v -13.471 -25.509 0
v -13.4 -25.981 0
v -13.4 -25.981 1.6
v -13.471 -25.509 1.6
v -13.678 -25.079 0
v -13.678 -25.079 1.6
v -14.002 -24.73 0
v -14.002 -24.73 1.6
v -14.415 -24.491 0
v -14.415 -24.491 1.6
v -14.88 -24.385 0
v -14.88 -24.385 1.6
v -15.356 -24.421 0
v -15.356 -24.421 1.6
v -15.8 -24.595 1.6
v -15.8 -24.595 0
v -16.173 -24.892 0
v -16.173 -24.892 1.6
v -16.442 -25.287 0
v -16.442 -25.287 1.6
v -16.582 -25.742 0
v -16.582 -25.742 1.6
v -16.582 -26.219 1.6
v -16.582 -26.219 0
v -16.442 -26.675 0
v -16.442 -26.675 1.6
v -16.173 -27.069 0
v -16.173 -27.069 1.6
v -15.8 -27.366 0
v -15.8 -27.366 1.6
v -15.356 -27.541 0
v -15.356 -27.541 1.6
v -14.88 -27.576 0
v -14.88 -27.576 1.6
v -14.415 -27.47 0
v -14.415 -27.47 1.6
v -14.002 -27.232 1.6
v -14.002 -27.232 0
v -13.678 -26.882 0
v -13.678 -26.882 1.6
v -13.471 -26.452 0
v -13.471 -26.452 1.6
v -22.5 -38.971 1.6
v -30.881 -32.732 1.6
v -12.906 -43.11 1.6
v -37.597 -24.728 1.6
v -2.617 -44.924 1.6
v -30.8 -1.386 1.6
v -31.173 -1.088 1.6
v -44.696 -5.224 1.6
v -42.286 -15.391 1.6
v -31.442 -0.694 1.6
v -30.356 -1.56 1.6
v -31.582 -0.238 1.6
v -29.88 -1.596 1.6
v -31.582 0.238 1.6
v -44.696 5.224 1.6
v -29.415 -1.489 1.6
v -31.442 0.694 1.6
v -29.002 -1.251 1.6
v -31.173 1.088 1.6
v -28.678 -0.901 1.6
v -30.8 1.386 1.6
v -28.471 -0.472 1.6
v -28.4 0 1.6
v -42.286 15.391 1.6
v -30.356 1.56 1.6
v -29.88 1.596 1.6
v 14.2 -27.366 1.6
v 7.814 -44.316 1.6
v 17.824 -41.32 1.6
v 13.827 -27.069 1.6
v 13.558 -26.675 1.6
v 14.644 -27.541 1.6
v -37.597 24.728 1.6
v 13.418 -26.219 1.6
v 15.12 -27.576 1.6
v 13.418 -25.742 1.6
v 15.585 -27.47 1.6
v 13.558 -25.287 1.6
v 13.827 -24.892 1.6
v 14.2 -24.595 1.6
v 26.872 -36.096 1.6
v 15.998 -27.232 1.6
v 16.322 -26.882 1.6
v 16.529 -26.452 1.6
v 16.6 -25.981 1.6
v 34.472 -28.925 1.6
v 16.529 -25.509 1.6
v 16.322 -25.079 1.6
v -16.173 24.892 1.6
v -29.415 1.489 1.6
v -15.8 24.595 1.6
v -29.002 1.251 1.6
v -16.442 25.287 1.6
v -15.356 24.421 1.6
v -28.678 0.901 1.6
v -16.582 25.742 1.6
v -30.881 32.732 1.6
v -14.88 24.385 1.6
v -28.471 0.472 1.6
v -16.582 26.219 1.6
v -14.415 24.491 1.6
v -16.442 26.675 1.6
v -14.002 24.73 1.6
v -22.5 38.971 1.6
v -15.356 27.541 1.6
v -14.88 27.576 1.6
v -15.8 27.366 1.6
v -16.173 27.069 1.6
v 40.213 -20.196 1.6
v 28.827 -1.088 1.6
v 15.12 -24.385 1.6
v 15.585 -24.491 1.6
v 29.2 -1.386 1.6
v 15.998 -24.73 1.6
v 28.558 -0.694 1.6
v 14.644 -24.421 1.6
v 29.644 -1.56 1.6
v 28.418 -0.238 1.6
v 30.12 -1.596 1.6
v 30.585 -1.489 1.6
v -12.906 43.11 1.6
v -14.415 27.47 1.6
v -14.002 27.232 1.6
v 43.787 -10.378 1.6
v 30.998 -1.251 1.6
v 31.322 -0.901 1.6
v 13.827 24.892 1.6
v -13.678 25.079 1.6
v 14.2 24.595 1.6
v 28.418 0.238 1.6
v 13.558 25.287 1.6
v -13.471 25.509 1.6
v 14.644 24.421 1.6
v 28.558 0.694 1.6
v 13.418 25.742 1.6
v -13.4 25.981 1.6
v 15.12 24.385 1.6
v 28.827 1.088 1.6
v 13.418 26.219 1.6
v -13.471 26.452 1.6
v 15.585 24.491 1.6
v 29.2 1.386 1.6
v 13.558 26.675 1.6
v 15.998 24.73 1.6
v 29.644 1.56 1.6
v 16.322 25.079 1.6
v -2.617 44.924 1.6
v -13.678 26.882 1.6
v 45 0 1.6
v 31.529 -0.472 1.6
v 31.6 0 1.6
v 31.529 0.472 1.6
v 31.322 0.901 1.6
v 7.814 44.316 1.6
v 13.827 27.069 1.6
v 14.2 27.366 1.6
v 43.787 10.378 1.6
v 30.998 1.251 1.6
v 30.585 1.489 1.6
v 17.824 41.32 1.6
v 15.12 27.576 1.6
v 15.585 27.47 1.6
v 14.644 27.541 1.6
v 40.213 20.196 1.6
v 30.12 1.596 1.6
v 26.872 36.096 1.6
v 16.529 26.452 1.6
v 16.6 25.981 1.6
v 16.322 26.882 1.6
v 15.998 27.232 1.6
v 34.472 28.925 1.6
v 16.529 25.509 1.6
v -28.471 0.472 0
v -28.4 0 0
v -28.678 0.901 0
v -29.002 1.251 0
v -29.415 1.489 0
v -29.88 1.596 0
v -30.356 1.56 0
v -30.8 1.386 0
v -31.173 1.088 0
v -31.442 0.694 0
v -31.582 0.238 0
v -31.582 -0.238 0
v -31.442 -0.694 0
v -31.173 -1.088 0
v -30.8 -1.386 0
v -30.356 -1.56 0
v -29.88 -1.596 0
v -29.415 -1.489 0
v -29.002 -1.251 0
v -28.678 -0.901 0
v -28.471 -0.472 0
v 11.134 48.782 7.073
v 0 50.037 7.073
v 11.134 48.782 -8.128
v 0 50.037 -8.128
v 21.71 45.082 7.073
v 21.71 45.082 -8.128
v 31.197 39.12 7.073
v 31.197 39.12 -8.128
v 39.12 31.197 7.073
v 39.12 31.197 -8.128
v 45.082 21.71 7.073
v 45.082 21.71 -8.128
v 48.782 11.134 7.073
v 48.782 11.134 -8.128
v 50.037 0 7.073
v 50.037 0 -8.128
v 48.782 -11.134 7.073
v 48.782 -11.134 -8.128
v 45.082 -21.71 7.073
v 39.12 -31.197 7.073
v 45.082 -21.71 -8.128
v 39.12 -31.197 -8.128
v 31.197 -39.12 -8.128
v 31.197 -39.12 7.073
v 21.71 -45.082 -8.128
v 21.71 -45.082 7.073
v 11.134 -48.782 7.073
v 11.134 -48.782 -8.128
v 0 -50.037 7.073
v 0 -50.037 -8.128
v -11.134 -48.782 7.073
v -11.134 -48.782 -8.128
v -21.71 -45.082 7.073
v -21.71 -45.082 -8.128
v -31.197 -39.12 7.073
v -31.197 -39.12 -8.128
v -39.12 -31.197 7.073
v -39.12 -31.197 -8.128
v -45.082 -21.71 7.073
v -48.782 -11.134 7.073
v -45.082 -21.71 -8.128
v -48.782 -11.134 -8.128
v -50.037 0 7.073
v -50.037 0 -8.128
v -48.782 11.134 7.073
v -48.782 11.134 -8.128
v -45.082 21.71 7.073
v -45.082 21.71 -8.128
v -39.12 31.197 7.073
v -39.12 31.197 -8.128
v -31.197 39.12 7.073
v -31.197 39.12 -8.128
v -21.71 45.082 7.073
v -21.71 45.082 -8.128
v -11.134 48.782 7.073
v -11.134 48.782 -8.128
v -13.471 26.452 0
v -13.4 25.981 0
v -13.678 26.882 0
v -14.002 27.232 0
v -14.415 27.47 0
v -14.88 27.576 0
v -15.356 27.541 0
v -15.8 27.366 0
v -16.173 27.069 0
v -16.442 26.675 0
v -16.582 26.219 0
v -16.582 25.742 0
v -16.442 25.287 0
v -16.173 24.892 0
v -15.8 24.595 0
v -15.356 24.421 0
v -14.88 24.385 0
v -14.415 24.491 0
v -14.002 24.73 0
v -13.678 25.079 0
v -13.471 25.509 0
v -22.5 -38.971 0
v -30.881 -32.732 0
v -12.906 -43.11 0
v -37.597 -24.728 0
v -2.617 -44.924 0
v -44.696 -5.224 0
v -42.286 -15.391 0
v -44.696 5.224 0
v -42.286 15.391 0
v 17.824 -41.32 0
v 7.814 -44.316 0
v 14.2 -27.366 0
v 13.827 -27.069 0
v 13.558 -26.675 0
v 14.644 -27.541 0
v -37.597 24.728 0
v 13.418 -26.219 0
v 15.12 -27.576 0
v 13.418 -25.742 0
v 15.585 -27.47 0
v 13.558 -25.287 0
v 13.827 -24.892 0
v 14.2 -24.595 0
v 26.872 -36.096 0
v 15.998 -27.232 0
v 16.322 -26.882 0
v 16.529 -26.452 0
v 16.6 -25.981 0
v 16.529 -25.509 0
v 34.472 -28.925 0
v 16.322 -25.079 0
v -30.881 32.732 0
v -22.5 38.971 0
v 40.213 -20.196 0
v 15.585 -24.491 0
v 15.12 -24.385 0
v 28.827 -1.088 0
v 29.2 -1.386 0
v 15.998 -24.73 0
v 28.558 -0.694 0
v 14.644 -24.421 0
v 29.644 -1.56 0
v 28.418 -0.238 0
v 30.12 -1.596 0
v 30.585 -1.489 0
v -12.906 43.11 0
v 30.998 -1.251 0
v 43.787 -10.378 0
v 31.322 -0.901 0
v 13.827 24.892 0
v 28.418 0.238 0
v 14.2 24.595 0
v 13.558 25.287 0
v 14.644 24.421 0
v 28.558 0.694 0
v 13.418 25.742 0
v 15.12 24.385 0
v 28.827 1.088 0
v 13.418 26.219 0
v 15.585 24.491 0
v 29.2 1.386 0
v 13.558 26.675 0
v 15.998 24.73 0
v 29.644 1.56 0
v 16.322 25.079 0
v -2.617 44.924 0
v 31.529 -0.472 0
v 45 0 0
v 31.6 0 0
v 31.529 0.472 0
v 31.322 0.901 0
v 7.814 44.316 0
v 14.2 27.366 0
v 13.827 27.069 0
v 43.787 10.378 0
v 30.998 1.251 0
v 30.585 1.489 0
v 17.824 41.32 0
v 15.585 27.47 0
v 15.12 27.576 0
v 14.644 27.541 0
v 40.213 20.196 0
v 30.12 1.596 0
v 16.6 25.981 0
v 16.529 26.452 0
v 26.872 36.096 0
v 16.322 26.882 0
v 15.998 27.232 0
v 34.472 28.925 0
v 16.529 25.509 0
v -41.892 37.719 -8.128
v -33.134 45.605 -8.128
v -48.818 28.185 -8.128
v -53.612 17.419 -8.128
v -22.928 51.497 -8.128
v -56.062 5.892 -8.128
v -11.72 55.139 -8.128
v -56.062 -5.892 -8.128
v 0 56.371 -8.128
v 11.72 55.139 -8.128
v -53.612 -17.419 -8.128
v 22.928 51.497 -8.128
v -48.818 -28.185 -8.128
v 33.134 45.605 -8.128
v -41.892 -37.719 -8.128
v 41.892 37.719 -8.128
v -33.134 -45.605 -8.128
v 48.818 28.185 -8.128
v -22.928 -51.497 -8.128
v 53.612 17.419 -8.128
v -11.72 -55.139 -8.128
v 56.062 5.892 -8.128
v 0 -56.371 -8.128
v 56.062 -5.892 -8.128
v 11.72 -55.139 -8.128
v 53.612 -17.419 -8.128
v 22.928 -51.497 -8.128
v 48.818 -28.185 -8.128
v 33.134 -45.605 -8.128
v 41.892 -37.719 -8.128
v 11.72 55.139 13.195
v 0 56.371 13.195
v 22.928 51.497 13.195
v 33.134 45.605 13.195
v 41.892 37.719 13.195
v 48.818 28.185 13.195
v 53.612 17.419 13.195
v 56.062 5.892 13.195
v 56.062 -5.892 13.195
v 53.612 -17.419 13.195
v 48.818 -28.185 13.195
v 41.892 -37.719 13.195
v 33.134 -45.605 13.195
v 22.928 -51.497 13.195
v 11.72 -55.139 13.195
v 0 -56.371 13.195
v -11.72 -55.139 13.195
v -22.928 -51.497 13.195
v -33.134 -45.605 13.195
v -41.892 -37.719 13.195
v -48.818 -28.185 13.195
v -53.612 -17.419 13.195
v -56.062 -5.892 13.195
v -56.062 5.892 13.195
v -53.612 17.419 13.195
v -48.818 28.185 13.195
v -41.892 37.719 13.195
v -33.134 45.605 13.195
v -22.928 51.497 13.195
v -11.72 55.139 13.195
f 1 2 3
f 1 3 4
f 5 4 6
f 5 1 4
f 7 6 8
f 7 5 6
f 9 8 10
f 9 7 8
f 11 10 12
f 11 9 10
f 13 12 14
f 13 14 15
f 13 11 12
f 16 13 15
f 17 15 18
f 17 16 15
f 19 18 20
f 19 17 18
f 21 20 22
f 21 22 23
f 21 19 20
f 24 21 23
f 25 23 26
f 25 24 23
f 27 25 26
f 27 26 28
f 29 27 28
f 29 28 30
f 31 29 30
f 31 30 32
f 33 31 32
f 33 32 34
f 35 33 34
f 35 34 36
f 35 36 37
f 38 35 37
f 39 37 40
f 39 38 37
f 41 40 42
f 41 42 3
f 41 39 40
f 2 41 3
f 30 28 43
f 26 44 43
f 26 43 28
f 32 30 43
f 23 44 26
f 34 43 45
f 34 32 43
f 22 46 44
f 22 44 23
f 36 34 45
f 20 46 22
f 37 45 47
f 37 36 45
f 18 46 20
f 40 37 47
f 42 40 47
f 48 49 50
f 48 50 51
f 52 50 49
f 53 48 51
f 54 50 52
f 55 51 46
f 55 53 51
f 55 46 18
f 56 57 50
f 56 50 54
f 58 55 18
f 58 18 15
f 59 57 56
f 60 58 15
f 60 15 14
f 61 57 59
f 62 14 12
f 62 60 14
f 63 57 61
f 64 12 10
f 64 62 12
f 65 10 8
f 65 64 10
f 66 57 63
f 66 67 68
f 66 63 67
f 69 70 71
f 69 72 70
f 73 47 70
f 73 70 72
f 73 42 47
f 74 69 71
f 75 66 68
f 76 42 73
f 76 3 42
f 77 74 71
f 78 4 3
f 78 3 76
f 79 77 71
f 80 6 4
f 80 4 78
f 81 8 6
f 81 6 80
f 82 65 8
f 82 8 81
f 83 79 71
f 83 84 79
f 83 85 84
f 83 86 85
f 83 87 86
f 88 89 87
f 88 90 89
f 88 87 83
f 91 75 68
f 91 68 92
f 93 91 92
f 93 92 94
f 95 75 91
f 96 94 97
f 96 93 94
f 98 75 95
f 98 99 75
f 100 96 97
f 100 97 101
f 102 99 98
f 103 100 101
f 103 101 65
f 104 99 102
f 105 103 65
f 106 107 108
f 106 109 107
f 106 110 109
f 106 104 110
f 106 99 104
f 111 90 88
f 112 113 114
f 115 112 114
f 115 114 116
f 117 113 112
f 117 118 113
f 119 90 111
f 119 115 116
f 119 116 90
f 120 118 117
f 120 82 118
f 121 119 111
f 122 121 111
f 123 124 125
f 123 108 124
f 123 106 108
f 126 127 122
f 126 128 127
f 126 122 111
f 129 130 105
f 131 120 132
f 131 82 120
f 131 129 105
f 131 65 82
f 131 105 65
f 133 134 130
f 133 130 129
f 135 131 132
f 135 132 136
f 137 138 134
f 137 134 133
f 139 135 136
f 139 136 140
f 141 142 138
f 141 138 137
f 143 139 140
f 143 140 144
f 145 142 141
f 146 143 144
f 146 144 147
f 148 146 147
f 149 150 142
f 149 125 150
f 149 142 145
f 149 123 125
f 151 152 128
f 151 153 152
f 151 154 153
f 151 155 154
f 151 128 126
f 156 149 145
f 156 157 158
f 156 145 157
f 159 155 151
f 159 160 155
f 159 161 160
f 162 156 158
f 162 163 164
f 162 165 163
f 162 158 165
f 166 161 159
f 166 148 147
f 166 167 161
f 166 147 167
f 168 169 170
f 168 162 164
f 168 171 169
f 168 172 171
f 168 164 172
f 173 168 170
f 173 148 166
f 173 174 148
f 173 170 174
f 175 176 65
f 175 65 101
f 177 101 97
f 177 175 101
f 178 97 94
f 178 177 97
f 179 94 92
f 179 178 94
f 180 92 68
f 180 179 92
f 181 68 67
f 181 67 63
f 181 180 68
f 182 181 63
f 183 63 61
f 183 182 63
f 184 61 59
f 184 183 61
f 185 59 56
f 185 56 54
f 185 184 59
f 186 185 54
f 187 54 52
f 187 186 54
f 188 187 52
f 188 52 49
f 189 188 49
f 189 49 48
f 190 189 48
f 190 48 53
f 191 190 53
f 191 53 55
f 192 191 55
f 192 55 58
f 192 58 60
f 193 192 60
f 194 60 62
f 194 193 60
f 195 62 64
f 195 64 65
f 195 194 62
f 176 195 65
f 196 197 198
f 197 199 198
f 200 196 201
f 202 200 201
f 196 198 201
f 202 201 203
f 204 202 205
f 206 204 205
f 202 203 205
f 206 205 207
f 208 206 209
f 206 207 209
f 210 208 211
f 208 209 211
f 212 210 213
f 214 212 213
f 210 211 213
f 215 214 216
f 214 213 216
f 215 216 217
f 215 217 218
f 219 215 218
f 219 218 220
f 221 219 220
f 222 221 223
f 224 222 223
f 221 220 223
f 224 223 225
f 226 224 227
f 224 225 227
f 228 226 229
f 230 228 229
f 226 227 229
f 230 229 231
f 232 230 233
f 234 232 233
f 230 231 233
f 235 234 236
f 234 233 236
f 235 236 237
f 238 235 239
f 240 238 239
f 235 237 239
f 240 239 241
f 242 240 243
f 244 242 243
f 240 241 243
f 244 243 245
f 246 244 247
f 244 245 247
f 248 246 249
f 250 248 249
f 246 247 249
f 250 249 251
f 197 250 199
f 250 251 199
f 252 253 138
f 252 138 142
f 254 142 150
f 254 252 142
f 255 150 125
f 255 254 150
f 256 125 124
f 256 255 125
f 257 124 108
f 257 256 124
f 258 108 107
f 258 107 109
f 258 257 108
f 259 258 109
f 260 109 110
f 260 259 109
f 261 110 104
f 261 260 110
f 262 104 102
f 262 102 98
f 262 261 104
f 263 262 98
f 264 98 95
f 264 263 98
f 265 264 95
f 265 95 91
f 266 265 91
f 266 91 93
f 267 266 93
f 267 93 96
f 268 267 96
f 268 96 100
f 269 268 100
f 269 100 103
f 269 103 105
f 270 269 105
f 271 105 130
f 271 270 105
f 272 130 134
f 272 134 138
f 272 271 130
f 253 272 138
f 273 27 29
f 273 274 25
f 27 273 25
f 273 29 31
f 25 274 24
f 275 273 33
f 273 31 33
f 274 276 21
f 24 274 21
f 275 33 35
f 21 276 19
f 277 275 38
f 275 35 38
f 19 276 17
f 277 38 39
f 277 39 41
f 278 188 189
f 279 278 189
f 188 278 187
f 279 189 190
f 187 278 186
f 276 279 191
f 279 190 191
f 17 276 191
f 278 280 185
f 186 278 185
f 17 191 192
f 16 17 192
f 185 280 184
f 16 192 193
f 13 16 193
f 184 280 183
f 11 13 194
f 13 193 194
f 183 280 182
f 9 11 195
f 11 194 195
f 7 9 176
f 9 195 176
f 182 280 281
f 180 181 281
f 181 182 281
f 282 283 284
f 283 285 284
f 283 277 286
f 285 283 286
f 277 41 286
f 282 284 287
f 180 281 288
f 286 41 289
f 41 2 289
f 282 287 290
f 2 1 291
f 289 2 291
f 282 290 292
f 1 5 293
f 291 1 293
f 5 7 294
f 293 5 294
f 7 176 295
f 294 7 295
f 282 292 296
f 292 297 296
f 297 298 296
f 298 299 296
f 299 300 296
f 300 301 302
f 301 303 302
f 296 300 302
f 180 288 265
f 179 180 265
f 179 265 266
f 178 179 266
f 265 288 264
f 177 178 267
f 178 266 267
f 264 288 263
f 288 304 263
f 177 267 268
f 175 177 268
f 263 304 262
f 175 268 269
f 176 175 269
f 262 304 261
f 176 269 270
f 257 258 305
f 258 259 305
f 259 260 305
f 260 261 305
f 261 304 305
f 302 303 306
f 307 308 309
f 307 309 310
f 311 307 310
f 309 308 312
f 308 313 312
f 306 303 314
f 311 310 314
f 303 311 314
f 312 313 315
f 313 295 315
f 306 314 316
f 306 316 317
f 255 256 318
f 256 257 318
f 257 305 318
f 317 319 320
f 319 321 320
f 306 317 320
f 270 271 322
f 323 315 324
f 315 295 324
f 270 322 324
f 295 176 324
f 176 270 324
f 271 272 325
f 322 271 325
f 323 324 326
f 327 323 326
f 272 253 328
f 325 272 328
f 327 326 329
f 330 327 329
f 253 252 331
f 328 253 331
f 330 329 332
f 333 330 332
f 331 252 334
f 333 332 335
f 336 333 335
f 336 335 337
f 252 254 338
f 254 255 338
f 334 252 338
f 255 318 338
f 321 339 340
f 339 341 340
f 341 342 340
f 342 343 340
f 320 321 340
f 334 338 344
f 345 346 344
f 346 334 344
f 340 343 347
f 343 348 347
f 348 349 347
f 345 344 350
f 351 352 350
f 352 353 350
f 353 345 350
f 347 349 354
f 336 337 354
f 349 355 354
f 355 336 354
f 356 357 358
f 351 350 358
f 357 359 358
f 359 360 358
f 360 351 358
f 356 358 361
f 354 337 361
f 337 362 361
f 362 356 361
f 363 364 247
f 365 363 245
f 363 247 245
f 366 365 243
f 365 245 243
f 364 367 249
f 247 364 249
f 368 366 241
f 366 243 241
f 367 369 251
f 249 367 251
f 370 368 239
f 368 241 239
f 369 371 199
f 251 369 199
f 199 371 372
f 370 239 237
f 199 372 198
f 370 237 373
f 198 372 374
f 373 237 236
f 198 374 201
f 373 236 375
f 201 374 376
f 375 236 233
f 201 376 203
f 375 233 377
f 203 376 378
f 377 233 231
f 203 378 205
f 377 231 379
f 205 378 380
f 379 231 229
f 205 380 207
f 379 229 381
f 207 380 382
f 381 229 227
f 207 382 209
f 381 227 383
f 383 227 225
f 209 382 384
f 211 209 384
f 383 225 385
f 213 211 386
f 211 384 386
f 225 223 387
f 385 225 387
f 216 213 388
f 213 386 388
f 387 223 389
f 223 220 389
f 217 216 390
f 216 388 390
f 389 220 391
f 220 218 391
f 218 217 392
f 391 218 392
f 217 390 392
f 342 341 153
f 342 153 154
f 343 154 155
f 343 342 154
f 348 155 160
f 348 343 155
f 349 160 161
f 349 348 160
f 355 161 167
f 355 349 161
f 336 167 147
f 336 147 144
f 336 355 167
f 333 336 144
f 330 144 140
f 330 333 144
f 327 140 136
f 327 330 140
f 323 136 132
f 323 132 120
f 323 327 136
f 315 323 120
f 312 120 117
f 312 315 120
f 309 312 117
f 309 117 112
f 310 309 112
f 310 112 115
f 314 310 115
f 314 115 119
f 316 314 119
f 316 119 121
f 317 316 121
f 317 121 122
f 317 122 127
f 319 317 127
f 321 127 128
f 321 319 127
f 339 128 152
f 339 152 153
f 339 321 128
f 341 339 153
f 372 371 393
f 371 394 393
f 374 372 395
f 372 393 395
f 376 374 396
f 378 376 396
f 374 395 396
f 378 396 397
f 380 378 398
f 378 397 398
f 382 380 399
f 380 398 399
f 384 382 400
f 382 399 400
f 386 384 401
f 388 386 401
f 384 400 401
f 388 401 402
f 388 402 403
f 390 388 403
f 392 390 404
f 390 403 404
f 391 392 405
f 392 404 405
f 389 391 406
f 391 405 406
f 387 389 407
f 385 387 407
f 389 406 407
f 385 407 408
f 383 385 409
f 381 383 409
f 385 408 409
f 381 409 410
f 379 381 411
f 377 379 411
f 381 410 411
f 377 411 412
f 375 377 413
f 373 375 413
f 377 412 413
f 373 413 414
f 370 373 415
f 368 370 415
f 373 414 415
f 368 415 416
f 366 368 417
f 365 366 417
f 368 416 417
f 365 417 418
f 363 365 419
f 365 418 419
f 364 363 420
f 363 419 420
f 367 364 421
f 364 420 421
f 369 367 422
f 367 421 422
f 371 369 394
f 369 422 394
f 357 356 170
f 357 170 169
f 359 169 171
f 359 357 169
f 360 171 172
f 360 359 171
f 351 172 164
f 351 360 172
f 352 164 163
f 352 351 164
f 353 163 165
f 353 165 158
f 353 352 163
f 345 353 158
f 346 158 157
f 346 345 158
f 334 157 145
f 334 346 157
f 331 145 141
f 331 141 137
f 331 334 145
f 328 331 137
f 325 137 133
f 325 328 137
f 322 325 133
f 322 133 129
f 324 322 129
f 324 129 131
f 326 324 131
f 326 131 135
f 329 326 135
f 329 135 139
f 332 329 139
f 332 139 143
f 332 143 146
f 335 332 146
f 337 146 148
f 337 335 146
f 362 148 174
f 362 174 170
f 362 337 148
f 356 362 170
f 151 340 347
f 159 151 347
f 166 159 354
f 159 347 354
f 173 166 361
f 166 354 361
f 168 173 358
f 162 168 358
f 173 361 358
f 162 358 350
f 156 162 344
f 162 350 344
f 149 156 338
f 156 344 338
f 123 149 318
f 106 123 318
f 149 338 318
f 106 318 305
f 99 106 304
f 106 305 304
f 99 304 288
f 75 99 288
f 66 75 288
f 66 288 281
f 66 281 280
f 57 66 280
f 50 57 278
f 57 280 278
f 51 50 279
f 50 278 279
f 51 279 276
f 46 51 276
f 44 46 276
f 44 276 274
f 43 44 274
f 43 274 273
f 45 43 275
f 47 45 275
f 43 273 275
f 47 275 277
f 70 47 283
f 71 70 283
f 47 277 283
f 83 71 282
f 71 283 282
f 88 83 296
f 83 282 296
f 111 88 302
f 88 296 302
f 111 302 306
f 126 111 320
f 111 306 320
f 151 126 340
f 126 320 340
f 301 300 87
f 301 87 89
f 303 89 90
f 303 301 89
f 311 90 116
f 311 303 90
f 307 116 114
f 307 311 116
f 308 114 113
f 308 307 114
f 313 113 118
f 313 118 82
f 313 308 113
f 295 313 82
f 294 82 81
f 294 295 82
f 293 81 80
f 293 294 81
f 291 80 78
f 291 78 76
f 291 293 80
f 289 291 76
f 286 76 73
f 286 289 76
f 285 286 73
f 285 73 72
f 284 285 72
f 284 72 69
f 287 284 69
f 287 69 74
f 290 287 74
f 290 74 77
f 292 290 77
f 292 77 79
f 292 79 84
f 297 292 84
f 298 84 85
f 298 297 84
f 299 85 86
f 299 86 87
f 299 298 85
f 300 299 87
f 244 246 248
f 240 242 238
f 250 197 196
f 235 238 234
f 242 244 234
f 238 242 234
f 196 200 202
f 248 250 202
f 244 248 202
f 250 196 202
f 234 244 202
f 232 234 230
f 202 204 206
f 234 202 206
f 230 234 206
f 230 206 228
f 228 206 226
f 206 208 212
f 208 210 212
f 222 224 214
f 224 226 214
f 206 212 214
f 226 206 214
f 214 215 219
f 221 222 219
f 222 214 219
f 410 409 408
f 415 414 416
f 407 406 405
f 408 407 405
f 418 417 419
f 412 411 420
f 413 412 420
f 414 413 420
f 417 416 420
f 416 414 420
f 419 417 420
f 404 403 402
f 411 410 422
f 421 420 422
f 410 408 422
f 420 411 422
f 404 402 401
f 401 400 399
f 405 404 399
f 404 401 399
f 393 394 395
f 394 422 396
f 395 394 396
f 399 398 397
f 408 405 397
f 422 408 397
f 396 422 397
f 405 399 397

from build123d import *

# Parameters (mm, degrees)
F0_R     = 45
F0_R_2   = 1.6
F1_DEPTH = 1.6


with BuildPart() as f1:
    # F0 (on Top) → F1 (new body)
    with BuildSketch(Plane.XY):
        Circle(F0_R)
        with Locations((-15, -25.980762)):
            Circle(F0_R_2, mode=Mode.SUBTRACT)
        with Locations((15, -25.980762)):
            Circle(F0_R_2, mode=Mode.SUBTRACT)
        with Locations((-30, 0)):
            Circle(F0_R_2, mode=Mode.SUBTRACT)
        with Locations((-15, 25.980762)):
            Circle(F0_R_2, mode=Mode.SUBTRACT)
        with Locations((30, 0)):
            Circle(F0_R_2, mode=Mode.SUBTRACT)
        with Locations((15, 25.980762)):
            Circle(F0_R_2, mode=Mode.SUBTRACT)
    extrude(amount=F1_DEPTH)


with BuildPart() as f3:
    # F2 (on Right) → F3 (revolve)
    with BuildSketch(Plane.YZ):
        Polygon((0, 13.195376), (0, 7.072721), (50.036862, 7.072721), (50.036862, -8.128352), (56.370642, -8.128352), (56.370642, 13.195376), align=None)
    revolve(axis=Axis((0, 0, 10.134049), (0, 0, -1)))


solid = Compound([f1.part, f3.part])
